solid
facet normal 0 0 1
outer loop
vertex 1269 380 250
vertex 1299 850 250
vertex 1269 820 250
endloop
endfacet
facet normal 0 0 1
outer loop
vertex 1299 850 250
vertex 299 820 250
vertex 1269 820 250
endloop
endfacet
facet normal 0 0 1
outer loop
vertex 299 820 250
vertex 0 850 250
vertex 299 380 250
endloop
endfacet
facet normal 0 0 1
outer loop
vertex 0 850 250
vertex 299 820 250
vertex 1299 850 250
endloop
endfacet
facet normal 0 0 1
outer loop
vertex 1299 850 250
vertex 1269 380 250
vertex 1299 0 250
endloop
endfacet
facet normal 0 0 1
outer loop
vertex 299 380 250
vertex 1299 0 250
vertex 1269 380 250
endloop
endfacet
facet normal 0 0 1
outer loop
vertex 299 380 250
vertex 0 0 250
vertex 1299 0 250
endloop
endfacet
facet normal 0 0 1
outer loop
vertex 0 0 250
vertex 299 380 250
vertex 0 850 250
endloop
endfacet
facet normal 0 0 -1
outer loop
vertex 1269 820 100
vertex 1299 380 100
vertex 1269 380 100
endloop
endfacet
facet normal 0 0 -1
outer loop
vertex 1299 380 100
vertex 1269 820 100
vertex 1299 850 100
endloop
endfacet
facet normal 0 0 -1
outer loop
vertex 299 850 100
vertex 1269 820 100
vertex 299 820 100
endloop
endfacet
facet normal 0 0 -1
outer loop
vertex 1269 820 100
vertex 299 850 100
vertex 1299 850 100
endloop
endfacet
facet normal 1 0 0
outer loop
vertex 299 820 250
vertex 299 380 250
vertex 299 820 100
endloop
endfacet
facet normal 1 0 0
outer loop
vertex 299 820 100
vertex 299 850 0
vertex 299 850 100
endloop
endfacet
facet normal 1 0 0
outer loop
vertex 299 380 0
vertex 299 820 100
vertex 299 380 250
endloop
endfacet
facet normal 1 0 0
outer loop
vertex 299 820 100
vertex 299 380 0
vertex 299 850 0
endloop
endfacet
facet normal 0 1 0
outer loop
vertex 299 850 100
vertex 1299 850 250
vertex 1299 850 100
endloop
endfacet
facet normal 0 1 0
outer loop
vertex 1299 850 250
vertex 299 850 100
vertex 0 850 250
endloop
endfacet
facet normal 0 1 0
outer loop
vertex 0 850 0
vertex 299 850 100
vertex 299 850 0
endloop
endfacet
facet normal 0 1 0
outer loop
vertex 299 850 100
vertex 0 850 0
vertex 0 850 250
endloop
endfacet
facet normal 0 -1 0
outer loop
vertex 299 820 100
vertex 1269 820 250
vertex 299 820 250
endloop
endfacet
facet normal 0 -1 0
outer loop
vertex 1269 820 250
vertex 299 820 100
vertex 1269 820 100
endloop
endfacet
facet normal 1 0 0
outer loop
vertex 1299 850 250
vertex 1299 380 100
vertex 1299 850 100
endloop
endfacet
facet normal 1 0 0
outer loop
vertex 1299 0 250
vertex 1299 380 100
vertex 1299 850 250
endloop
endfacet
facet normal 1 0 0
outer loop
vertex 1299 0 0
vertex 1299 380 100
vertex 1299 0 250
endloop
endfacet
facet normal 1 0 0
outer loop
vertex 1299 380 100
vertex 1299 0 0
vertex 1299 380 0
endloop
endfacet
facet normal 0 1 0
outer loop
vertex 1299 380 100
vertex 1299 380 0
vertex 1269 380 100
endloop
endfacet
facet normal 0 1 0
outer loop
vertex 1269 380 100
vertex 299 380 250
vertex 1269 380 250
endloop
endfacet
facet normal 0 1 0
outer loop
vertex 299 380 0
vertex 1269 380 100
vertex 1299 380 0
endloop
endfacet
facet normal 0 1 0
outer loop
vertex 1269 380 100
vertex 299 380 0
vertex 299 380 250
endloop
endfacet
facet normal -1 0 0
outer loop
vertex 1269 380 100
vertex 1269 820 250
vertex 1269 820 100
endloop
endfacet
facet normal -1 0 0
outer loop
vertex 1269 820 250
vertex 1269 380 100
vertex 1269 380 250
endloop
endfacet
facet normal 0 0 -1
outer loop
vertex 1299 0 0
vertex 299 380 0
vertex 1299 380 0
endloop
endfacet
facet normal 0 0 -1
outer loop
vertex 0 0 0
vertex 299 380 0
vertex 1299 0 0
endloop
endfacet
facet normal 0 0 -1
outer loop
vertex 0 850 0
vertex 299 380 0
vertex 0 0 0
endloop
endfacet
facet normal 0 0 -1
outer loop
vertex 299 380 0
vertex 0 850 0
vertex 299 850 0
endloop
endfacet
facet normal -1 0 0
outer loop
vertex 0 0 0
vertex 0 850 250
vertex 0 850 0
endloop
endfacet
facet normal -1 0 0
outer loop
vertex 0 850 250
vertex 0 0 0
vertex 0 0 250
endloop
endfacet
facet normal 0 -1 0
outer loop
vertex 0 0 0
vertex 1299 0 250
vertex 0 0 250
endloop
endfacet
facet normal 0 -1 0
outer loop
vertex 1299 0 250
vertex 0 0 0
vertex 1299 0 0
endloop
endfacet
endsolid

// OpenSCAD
// file: wall/wall.scad
// Massstab 1 entspricht einem cm

module wall(length, height, depth, phased) {
	aPhased = 
		(phased == undef) ? [true, true] : phased;
	aLength = 
		(aPhased[0] && aPhased[1]) ? 
			length - 2 * depth : 
			(aPhased[0] || aPhased[1]) ? 
				length - depth : length;

	union() {
		if(aPhased[0]) {
			rotate([0, 0, 270])
				antiprism(height, depth);
			translate ([depth, -depth, 0])	
				cube(size = [aLength, depth, 
					height]);	
		} else {
			translate ([0, -depth, 0])	
				cube(size = [aLength, depth, 
						height]);	
		}
		if(aPhased[1]) {
			translate ([length - depth, -depth, 0])
				antiprism(height, depth);
		}
	}
}

module antiprism(heihgt, depth) {
	polyhedron ( points = [
			[0, 0, heihgt], 
			[0, depth, heihgt], 
			[depth, depth, heihgt], 
			[0, 0, 0], 
			[0, depth, 0], 
			[depth, depth, 0], ], 
		triangles = [
			[0, 1, 2], 
			[0, 5, 3],
			[4, 1, 0],
			[0, 3, 4],
			[5, 3, 0],
			[0, 2, 5],
			[4, 2, 1],
			[2, 4, 5],
			[5, 4, 3], ]);
}

wall (200, 150, 36);

translate([0, 100, 0])
	wall (200, 150, 36, [true, true]);

translate([0, 200, 0])
	wall (200, 150, 36, [false, true]);

translate([0, 300, 0])
	wall (200, 150, 36, [false, false]);
// main file
// Massstab 1 entspricht einem cm
use <wall/wall.scad>

module basement(width, depth, wallColor) {
   neukellerbreite = 30 + 250 + 19;
	color(wallColor)
	union() {
		cube(size = [neukellerbreite,850,250]);
		translate([neukellerbreite, 0, 0]) {
			cube(size = [1000,380,250]);
		}
		translate([neukellerbreite, depth, 100])
			wall(width - neukellerbreite, 150, 30, 
				[false, true]);
		rotate([0, 0, 270])
			translate([-depth, width, 100])
				wall(depth - 380, 150, 30, 
					[true, false]);
	}
}

basement(1299, 850, [ 160/255, 160/255, 160/255 ]);
